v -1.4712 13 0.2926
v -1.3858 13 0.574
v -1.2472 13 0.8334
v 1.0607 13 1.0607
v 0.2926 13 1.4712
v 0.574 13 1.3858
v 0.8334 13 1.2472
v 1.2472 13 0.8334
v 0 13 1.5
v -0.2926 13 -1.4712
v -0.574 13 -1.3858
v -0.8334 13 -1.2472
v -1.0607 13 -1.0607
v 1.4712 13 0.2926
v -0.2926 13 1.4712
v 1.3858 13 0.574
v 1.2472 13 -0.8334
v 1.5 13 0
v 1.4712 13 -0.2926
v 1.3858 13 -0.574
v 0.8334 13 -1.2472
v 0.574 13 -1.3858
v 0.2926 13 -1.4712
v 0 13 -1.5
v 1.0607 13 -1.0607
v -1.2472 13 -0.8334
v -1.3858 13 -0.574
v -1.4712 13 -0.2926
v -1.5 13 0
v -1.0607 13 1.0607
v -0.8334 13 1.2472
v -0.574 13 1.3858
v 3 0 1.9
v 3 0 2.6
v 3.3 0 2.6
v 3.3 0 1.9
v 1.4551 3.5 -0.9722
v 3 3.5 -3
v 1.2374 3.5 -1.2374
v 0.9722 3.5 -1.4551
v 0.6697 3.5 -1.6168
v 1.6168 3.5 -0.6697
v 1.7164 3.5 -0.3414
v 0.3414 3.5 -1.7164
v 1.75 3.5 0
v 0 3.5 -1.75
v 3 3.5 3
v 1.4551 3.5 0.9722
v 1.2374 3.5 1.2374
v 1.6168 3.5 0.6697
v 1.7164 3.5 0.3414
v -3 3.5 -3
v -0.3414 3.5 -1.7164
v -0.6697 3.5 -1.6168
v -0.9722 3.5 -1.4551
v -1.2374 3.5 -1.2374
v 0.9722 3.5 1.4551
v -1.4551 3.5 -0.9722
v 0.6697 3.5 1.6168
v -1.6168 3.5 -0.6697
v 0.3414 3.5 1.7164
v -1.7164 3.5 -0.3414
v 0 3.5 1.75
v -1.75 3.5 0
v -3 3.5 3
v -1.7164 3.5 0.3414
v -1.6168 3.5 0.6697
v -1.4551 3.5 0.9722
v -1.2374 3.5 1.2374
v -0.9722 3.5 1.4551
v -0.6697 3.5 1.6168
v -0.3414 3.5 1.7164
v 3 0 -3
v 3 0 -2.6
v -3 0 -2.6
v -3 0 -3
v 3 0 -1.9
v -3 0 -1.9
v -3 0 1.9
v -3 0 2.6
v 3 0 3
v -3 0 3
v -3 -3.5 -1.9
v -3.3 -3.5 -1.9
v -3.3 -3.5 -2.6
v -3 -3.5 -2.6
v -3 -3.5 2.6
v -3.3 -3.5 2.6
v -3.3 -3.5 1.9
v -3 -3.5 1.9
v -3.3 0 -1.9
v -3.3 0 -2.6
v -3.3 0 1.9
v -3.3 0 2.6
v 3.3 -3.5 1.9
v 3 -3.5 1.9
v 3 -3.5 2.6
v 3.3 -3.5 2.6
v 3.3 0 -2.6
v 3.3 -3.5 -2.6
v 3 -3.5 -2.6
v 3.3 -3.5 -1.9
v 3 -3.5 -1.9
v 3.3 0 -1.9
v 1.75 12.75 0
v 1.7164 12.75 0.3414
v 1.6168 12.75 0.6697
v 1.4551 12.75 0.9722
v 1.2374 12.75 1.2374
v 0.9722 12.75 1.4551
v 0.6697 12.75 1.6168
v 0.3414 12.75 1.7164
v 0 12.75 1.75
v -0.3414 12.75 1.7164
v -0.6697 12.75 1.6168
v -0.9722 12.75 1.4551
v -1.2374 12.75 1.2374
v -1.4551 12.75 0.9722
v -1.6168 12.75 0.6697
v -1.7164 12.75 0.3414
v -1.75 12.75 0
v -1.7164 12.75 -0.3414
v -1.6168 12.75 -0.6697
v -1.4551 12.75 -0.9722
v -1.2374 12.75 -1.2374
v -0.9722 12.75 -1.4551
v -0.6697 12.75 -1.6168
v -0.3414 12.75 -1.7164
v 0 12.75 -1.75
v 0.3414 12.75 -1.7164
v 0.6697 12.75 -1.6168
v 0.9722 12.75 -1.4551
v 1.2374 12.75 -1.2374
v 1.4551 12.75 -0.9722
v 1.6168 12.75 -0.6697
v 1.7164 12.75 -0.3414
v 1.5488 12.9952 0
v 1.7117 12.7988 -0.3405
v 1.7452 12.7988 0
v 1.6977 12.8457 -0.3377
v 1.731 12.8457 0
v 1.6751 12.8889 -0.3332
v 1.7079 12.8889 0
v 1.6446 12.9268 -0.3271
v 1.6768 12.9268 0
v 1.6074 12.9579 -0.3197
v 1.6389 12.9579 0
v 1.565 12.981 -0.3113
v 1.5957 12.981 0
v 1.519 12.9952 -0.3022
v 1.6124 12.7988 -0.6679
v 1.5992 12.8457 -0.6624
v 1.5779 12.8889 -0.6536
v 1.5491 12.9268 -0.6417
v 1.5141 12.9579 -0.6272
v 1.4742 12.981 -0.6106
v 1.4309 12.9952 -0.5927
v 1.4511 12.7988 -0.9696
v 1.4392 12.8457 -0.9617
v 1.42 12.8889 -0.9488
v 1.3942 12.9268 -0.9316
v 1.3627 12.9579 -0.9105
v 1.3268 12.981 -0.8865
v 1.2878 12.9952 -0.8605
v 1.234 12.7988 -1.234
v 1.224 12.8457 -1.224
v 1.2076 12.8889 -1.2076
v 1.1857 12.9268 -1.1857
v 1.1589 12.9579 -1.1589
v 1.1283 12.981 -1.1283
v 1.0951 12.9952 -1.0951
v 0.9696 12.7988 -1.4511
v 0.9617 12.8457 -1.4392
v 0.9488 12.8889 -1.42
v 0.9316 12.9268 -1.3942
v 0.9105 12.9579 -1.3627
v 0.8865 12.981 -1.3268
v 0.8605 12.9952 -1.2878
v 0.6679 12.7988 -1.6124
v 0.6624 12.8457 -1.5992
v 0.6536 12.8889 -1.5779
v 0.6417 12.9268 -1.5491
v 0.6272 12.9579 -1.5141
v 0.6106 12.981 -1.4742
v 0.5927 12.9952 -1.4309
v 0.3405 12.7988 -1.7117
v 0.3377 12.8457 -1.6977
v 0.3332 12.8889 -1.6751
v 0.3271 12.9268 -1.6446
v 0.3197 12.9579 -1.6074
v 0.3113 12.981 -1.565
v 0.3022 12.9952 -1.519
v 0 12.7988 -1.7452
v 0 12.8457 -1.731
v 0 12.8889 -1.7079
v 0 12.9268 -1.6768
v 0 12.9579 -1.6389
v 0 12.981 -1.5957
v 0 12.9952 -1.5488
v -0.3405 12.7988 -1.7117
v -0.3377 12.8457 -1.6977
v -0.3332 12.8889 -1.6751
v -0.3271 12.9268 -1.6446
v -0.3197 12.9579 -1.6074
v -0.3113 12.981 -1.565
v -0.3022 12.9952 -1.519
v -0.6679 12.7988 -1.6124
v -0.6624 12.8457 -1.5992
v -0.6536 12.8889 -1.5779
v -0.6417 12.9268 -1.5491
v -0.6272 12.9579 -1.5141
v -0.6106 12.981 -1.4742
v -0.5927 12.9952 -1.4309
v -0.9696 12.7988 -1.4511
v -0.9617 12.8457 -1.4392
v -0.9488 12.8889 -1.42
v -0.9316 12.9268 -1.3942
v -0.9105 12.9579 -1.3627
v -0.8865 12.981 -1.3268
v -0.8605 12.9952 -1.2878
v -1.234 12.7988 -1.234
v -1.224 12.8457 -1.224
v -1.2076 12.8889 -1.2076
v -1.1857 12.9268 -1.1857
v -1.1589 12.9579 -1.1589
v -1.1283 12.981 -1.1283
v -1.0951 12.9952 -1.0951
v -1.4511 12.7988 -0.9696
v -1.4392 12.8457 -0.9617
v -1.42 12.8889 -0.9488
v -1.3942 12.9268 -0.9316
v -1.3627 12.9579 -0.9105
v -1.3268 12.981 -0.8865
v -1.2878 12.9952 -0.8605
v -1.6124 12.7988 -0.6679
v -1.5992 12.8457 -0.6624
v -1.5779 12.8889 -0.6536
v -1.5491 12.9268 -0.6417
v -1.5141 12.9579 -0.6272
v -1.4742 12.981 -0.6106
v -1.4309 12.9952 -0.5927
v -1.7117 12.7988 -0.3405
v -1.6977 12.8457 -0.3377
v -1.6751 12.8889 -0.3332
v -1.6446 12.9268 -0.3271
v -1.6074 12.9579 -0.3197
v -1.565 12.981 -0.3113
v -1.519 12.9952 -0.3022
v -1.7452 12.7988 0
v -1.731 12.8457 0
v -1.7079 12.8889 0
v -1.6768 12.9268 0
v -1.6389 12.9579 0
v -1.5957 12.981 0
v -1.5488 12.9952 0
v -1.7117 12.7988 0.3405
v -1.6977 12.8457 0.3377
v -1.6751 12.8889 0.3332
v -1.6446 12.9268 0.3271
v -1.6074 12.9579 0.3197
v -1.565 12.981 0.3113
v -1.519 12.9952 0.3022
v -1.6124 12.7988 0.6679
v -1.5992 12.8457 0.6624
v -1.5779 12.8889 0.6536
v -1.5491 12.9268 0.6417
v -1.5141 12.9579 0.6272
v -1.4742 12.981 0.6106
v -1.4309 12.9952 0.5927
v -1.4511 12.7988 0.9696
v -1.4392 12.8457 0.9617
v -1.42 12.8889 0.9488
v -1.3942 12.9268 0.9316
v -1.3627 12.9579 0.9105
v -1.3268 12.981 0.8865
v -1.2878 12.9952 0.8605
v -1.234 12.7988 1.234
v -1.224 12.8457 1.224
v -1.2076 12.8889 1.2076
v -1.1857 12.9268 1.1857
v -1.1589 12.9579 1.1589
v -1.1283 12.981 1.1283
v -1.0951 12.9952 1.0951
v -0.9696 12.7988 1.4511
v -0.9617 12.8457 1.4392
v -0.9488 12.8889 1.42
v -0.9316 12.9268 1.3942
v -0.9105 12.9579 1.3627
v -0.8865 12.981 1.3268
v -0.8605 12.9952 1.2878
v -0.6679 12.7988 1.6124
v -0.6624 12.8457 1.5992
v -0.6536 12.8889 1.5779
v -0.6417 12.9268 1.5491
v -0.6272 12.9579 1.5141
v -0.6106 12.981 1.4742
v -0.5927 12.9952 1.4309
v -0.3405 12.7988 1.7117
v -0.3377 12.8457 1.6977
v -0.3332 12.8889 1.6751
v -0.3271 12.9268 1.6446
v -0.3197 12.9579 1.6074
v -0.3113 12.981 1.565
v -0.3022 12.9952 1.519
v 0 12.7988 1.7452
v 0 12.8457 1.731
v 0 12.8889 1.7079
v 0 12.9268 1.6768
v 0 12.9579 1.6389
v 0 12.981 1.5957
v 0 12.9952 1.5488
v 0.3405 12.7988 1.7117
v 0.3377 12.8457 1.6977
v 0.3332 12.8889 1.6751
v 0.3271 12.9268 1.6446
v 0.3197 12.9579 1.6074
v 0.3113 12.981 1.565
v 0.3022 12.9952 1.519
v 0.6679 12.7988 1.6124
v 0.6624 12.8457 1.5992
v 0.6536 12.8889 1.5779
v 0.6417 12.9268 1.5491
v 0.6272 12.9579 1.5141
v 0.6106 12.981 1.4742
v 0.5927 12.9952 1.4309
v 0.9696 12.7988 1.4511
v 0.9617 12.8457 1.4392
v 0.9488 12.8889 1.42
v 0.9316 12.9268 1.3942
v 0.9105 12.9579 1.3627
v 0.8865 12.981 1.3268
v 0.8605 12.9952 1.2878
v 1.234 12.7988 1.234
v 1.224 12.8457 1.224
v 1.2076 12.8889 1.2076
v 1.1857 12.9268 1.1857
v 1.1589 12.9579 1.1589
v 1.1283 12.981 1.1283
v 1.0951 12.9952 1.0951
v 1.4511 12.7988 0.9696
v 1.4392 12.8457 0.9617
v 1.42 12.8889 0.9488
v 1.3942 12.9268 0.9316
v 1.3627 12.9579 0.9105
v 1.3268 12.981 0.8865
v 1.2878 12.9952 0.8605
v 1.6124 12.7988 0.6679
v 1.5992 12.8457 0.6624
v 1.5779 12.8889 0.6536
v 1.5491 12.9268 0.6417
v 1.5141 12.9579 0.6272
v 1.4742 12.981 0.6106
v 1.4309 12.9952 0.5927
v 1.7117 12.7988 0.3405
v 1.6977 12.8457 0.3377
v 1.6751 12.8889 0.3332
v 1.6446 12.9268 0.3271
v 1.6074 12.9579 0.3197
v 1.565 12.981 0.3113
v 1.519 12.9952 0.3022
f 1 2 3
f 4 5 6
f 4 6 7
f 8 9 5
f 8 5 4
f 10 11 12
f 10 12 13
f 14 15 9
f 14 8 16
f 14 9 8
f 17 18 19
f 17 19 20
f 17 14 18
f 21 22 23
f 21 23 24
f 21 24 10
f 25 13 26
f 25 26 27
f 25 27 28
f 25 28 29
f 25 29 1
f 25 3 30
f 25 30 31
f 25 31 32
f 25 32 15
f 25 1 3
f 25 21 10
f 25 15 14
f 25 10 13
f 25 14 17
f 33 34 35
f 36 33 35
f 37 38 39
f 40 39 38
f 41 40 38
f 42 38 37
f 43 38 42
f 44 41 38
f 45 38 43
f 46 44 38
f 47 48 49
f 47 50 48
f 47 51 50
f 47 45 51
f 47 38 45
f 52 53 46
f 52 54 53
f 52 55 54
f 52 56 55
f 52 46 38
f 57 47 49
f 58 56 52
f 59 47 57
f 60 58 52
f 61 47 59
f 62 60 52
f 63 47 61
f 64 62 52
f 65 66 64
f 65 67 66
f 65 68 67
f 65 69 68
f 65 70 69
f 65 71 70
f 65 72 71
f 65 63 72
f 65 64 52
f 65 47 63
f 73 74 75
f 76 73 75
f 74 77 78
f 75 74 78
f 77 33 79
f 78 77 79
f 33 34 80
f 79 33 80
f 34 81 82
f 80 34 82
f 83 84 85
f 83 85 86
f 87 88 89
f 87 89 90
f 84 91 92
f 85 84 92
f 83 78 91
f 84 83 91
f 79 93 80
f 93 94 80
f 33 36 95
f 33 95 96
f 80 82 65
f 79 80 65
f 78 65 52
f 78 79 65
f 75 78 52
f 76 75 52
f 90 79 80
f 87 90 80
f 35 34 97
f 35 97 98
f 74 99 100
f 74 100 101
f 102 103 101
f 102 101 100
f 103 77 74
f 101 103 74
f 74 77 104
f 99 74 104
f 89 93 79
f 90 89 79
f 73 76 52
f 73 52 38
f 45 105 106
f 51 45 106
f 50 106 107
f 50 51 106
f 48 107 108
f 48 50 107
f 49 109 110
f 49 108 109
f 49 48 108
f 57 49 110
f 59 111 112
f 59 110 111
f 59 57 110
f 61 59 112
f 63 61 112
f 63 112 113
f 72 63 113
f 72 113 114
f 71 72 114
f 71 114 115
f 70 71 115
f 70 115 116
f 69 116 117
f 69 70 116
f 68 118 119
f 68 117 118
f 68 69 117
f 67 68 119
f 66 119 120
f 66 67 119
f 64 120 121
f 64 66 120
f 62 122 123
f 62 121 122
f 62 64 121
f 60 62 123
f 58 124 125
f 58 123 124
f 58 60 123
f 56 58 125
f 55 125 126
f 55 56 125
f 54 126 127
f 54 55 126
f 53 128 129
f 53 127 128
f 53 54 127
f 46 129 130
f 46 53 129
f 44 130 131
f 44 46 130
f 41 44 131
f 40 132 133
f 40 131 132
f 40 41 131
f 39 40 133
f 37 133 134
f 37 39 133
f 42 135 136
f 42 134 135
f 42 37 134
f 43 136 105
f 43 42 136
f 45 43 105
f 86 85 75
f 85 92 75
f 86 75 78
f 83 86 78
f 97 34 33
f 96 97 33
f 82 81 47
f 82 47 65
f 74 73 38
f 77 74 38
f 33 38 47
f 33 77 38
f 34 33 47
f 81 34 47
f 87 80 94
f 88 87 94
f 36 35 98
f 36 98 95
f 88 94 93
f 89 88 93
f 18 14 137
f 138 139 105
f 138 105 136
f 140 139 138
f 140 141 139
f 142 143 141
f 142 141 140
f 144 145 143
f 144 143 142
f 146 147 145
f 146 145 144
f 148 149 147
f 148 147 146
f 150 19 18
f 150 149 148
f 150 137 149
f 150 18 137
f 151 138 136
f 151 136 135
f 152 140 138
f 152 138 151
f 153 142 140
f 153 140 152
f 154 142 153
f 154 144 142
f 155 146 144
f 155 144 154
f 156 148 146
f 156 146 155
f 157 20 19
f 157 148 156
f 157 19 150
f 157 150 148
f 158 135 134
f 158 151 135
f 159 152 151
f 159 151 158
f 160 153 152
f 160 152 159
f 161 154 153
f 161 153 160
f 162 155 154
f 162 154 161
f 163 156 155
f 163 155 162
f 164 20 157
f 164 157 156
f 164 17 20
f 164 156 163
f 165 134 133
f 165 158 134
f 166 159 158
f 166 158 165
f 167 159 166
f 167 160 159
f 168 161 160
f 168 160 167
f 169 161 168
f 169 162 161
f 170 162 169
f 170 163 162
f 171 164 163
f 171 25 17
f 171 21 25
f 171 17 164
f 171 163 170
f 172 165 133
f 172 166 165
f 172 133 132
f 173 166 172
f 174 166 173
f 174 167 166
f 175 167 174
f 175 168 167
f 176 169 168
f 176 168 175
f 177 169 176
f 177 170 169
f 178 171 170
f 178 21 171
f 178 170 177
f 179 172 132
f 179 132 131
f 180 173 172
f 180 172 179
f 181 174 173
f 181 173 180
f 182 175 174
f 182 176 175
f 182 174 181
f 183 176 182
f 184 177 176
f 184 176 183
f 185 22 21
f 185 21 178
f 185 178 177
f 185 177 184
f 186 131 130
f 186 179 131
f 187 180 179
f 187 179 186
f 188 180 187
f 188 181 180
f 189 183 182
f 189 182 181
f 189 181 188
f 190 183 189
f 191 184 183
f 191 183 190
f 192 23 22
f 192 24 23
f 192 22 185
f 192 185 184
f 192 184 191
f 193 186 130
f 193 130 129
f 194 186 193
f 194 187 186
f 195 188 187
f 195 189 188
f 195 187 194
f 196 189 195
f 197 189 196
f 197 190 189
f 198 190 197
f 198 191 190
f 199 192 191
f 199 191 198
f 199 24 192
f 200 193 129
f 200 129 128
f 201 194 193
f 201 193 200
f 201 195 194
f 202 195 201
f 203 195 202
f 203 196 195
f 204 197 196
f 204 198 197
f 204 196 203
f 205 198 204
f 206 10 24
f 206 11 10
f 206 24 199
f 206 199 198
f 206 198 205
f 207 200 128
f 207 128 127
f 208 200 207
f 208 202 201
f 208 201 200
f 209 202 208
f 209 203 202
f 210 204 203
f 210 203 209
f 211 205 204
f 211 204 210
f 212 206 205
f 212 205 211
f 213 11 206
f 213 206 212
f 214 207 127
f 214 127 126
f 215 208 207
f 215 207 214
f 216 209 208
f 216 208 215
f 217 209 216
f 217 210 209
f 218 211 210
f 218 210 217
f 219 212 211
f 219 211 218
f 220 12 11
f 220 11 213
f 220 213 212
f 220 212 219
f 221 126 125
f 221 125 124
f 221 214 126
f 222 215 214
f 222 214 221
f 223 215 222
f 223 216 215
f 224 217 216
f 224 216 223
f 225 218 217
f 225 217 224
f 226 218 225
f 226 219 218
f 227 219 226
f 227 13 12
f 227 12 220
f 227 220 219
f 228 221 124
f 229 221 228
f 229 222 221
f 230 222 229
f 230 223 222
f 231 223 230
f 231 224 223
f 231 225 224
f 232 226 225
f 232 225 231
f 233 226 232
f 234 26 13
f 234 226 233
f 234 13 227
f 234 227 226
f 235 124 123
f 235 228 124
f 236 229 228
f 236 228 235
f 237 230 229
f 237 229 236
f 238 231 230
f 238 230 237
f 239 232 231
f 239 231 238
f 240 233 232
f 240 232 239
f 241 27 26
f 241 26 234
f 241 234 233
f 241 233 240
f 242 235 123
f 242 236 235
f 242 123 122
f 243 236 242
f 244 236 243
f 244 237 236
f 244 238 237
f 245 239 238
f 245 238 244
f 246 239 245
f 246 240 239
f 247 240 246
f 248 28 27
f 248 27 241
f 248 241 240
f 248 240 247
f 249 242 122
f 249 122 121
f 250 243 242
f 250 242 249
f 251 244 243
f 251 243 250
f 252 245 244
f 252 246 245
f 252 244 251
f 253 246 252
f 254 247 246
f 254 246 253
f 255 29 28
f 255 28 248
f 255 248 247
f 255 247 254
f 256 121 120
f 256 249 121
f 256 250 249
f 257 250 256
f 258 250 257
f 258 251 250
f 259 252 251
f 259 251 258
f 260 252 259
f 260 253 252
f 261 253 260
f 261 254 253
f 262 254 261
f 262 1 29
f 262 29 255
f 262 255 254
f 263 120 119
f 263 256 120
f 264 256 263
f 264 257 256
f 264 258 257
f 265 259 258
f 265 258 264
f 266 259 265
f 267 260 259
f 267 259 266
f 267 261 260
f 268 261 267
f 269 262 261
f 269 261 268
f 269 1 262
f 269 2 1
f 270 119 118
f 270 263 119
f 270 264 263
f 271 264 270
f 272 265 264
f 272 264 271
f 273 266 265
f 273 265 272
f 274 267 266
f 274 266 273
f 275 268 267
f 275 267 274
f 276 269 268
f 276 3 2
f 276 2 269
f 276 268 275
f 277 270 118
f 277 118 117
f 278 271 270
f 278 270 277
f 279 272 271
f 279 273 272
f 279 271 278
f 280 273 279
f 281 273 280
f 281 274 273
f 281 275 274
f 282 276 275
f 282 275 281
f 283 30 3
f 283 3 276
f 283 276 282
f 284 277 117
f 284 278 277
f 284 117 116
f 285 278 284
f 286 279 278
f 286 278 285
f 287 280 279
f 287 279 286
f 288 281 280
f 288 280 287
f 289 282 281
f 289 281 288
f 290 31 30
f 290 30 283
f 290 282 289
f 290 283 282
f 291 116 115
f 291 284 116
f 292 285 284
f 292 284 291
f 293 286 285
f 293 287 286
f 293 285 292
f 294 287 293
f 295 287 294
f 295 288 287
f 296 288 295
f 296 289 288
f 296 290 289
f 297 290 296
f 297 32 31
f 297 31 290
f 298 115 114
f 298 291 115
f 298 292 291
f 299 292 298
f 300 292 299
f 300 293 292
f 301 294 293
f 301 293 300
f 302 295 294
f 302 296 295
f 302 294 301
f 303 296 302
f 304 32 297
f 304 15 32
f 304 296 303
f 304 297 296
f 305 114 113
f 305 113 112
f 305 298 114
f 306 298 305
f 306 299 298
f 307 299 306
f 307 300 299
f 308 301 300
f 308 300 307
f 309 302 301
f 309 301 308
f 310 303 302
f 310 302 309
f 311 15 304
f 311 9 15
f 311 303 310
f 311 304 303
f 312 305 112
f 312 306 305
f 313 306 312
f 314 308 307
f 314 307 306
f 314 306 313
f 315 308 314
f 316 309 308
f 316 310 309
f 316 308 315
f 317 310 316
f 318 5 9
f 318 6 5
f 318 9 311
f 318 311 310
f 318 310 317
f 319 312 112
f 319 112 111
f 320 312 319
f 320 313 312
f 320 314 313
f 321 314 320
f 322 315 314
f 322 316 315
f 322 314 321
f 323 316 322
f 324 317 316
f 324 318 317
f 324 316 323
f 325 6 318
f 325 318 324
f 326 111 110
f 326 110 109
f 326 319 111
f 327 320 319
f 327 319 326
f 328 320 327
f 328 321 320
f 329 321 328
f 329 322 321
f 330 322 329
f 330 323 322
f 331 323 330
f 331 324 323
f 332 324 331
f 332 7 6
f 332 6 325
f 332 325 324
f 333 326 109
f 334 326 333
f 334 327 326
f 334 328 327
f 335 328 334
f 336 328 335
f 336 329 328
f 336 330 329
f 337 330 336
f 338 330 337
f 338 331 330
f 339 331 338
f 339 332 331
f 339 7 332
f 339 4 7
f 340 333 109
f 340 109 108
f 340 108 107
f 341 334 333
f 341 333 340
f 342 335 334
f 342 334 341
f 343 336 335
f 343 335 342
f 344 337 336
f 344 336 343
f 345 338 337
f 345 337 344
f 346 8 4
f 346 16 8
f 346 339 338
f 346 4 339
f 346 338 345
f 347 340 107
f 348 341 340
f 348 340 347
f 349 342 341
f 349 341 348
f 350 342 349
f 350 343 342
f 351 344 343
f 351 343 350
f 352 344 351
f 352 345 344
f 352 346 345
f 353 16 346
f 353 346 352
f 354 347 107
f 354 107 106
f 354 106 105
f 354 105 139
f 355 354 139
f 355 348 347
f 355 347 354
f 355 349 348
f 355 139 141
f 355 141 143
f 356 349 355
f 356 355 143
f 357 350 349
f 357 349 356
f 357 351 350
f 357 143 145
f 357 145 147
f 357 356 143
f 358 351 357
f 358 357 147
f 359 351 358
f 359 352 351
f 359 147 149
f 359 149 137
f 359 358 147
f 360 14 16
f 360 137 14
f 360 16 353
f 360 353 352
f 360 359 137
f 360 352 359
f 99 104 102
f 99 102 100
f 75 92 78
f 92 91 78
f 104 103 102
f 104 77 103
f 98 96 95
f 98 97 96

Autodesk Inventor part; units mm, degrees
ref_plane "YZ Plane" through (0, 0, 0) normal (1, 0, 0) x (0, 1, 0)
ref_plane "XZ Plane" through (0, 0, 0) normal (0, 1, 0) x (-1, 0, 0)
ref_plane "XY Plane" through (0, 0, 0) normal (0, 0, 1) x (1, 0, 0)
sketch "Esquisse1" plane through (0, 0, 0) normal (0, 1, 0) x (-1, 0, 0)
  line L0 (3, -3) -> (-3, -3)
  line L1 (-3, -3) -> (-3, 3)
  line L2 (-3, 3) -> (3, 3)
  line L3 (3, 3) -> (3, -3)
  point P0 (0, 0)
  dimension "d0" = 6
  dimension "d1" = 6
  dimension "d2" = 3
  dimension "d3" = 3
extrude "Extrusion1" add sketch "Esquisse1" along normal blind 3.5
sketch "Esquisse2" plane through (0, 3.5, 0) normal (0, 1, 0) x (1, 0, 0)
  circle A0 centre (0, 0) radius 1.75
  dimension "d6" = 3.5
extrude "Extrusion2" add sketch "Esquisse2" along normal blind 9.5
fillet "Congé1" radius 0.25 1 edges at (-1.75, 13, 0)
sketch "Esquisse3" plane through (0, 0, 0) normal (0, -1, 0) x (1, 0, 0)
  line L0 (3, 3) -> (3, -3) projected
  line L1 (3, 2.6) -> (3.3, 2.6)
  line L2 (3.3, 2.6) -> (3.3, 1.9)
  line L3 (3.3, 1.9) -> (3, 1.9)
  line L4 (3, 1.9) -> (3, 2.6)
  line L5 (3, -1.9) -> (3.3, -1.9)
  line L6 (3.3, -1.9) -> (3.3, -2.6)
  line L7 (3.3, -2.6) -> (3, -2.6)
  line L8 (3, -2.6) -> (3, -1.9)
  line L9 (-3, -3) -> (-3, 3) projected
  line L10 (-3, 2.6) -> (-3.3, 2.6)
  line L11 (-3.3, 2.6) -> (-3.3, 1.9)
  line L12 (-3.3, 1.9) -> (-3, 1.9)
  line L13 (-3, 1.9) -> (-3, 2.6)
  line L14 (-3, -1.9) -> (-3.3, -1.9)
  line L15 (-3.3, -1.9) -> (-3.3, -2.6)
  line L16 (-3.3, -2.6) -> (-3, -2.6)
  line L17 (-3, -2.6) -> (-3, -1.9)
  point P0 (0, 0)
  dimension "d11" = 0.7
  dimension "d12" = 0.3
  dimension "d13" = 0.7
  dimension "d14" = 0.3
  dimension "d15" = 3.8
  dimension "d16" = 6
  dimension "d17" = 0.4
  dimension "d18" = 0.7
  dimension "d19" = 0.7
  dimension "d20" = 3.8
  dimension "d21" = 0.3
  dimension "d22" = 0.3
  dimension "d23" = 0.4
extrude "Extrusion3" add sketch "Esquisse3" along normal blind 3.5
equation "\"d1\" = d0"
equation "\"d2\" = 0.5 * d0"
equation "\"d3\" = 0.5 * d1"
equation "\"d13\" = d11"
equation "\"d14\" = d12"
equation "\"d17\" = -0.5 * d15 + 0.5 * d16 - d11"
equation "\"d18\" = d11"
equation "\"d19\" = d11"
equation "\"d20\" = d15"
equation "\"d21\" = d12"
equation "\"d22\" = d21"
equation "\"d23\" = d17"
properties part number "Touch Button High"
